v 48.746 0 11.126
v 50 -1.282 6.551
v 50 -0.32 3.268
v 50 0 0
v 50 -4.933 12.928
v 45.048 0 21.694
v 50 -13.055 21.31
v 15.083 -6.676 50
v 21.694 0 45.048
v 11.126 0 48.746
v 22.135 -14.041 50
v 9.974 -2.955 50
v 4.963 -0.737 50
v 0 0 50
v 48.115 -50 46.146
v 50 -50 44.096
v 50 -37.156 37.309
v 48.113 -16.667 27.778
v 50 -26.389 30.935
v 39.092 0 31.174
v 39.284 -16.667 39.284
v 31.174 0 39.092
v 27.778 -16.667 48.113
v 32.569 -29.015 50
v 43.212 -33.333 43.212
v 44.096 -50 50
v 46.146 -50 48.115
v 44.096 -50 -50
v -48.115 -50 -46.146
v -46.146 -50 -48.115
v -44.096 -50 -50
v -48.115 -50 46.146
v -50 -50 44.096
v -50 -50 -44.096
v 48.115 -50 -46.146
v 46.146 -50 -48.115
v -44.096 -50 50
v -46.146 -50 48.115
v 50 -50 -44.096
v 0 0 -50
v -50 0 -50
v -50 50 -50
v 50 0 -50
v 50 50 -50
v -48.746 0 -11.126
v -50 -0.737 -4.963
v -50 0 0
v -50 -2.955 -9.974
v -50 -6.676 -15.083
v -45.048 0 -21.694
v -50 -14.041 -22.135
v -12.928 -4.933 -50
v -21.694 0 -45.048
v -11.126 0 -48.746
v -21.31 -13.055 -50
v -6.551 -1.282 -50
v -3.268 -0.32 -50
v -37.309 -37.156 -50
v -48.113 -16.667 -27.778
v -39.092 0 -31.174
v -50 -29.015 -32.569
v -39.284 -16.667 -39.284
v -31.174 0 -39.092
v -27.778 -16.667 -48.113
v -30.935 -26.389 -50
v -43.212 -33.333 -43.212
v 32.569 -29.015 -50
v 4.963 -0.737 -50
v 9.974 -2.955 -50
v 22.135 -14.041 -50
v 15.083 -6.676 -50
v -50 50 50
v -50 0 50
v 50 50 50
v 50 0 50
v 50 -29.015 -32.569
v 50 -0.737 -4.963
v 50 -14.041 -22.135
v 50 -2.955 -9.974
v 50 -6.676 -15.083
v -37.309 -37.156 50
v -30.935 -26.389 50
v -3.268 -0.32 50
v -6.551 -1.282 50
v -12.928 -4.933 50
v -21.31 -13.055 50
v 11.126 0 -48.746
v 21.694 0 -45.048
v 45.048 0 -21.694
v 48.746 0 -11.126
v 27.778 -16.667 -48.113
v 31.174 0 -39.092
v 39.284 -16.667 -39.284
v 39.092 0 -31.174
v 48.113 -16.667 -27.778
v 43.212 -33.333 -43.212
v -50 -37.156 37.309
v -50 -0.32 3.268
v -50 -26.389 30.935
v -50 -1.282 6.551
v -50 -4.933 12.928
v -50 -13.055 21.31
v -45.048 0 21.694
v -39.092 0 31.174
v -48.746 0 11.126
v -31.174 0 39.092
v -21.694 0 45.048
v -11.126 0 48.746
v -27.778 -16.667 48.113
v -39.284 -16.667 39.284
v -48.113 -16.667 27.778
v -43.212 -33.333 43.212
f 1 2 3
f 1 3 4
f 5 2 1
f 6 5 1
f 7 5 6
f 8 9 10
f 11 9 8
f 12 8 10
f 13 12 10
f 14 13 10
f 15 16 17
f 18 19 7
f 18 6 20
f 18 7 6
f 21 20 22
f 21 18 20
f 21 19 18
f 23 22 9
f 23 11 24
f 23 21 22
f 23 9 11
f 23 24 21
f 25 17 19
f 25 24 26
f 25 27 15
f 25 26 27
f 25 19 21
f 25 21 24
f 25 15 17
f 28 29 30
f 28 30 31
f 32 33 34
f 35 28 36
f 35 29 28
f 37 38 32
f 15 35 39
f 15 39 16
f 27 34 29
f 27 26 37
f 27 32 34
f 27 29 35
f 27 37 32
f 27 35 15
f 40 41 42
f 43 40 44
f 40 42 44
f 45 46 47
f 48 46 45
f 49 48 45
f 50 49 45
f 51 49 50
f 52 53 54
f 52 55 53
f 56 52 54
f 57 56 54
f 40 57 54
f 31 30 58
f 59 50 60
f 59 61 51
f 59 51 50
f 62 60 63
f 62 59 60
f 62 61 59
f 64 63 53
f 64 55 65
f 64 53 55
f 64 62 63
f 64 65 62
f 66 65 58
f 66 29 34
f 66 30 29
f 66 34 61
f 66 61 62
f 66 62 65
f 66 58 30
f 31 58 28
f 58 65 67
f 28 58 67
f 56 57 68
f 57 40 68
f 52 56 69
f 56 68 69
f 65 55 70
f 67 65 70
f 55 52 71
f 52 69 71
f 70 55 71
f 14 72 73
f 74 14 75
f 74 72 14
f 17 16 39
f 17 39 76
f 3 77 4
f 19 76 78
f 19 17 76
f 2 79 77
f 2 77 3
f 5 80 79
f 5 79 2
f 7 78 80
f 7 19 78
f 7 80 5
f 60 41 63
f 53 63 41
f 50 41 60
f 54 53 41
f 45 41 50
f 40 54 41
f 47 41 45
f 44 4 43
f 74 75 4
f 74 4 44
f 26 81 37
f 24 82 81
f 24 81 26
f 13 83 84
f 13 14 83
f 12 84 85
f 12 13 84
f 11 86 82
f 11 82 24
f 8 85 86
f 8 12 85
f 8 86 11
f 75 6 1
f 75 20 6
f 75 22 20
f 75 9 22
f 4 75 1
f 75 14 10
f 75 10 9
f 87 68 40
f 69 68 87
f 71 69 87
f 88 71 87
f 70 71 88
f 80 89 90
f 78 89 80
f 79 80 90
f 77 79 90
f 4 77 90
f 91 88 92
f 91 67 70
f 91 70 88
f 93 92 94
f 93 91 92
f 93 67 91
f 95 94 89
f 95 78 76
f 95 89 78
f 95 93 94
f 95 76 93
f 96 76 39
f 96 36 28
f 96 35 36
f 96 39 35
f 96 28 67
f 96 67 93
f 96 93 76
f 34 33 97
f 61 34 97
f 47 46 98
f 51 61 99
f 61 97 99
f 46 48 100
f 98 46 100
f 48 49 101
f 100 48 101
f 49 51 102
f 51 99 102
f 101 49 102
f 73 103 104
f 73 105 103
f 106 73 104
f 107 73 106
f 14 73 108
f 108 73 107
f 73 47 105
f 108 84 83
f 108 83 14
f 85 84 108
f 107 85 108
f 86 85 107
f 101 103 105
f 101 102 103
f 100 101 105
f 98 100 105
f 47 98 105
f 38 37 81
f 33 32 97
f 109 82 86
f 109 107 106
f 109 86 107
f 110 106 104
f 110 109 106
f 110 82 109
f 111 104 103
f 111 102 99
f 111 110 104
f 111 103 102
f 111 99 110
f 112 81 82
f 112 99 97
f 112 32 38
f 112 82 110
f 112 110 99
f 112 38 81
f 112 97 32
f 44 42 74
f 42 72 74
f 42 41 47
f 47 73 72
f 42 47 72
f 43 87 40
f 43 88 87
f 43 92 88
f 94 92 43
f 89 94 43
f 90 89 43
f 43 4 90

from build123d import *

# Parameters (mm, degrees)
F0_W     = 100
F0_H     = 100
F1_DEPTH = 50


with BuildPart() as f1:
    # F0 (on Top) → F1 (new body, symmetric)
    with BuildSketch(Plane.XY):
        Rectangle(F0_W, F0_H)
    extrude(amount=F1_DEPTH, both=True)

    # F2 (on Top) → F3 (revolve, cut)
    with BuildSketch(Plane.XY):
        Polygon((75, 0), (50, 0), (75, -75), align=None)
    revolve(axis=Axis((0, -37.5, 0), (0, -1, 0)), mode=Mode.SUBTRACT)


solid = f1.part
